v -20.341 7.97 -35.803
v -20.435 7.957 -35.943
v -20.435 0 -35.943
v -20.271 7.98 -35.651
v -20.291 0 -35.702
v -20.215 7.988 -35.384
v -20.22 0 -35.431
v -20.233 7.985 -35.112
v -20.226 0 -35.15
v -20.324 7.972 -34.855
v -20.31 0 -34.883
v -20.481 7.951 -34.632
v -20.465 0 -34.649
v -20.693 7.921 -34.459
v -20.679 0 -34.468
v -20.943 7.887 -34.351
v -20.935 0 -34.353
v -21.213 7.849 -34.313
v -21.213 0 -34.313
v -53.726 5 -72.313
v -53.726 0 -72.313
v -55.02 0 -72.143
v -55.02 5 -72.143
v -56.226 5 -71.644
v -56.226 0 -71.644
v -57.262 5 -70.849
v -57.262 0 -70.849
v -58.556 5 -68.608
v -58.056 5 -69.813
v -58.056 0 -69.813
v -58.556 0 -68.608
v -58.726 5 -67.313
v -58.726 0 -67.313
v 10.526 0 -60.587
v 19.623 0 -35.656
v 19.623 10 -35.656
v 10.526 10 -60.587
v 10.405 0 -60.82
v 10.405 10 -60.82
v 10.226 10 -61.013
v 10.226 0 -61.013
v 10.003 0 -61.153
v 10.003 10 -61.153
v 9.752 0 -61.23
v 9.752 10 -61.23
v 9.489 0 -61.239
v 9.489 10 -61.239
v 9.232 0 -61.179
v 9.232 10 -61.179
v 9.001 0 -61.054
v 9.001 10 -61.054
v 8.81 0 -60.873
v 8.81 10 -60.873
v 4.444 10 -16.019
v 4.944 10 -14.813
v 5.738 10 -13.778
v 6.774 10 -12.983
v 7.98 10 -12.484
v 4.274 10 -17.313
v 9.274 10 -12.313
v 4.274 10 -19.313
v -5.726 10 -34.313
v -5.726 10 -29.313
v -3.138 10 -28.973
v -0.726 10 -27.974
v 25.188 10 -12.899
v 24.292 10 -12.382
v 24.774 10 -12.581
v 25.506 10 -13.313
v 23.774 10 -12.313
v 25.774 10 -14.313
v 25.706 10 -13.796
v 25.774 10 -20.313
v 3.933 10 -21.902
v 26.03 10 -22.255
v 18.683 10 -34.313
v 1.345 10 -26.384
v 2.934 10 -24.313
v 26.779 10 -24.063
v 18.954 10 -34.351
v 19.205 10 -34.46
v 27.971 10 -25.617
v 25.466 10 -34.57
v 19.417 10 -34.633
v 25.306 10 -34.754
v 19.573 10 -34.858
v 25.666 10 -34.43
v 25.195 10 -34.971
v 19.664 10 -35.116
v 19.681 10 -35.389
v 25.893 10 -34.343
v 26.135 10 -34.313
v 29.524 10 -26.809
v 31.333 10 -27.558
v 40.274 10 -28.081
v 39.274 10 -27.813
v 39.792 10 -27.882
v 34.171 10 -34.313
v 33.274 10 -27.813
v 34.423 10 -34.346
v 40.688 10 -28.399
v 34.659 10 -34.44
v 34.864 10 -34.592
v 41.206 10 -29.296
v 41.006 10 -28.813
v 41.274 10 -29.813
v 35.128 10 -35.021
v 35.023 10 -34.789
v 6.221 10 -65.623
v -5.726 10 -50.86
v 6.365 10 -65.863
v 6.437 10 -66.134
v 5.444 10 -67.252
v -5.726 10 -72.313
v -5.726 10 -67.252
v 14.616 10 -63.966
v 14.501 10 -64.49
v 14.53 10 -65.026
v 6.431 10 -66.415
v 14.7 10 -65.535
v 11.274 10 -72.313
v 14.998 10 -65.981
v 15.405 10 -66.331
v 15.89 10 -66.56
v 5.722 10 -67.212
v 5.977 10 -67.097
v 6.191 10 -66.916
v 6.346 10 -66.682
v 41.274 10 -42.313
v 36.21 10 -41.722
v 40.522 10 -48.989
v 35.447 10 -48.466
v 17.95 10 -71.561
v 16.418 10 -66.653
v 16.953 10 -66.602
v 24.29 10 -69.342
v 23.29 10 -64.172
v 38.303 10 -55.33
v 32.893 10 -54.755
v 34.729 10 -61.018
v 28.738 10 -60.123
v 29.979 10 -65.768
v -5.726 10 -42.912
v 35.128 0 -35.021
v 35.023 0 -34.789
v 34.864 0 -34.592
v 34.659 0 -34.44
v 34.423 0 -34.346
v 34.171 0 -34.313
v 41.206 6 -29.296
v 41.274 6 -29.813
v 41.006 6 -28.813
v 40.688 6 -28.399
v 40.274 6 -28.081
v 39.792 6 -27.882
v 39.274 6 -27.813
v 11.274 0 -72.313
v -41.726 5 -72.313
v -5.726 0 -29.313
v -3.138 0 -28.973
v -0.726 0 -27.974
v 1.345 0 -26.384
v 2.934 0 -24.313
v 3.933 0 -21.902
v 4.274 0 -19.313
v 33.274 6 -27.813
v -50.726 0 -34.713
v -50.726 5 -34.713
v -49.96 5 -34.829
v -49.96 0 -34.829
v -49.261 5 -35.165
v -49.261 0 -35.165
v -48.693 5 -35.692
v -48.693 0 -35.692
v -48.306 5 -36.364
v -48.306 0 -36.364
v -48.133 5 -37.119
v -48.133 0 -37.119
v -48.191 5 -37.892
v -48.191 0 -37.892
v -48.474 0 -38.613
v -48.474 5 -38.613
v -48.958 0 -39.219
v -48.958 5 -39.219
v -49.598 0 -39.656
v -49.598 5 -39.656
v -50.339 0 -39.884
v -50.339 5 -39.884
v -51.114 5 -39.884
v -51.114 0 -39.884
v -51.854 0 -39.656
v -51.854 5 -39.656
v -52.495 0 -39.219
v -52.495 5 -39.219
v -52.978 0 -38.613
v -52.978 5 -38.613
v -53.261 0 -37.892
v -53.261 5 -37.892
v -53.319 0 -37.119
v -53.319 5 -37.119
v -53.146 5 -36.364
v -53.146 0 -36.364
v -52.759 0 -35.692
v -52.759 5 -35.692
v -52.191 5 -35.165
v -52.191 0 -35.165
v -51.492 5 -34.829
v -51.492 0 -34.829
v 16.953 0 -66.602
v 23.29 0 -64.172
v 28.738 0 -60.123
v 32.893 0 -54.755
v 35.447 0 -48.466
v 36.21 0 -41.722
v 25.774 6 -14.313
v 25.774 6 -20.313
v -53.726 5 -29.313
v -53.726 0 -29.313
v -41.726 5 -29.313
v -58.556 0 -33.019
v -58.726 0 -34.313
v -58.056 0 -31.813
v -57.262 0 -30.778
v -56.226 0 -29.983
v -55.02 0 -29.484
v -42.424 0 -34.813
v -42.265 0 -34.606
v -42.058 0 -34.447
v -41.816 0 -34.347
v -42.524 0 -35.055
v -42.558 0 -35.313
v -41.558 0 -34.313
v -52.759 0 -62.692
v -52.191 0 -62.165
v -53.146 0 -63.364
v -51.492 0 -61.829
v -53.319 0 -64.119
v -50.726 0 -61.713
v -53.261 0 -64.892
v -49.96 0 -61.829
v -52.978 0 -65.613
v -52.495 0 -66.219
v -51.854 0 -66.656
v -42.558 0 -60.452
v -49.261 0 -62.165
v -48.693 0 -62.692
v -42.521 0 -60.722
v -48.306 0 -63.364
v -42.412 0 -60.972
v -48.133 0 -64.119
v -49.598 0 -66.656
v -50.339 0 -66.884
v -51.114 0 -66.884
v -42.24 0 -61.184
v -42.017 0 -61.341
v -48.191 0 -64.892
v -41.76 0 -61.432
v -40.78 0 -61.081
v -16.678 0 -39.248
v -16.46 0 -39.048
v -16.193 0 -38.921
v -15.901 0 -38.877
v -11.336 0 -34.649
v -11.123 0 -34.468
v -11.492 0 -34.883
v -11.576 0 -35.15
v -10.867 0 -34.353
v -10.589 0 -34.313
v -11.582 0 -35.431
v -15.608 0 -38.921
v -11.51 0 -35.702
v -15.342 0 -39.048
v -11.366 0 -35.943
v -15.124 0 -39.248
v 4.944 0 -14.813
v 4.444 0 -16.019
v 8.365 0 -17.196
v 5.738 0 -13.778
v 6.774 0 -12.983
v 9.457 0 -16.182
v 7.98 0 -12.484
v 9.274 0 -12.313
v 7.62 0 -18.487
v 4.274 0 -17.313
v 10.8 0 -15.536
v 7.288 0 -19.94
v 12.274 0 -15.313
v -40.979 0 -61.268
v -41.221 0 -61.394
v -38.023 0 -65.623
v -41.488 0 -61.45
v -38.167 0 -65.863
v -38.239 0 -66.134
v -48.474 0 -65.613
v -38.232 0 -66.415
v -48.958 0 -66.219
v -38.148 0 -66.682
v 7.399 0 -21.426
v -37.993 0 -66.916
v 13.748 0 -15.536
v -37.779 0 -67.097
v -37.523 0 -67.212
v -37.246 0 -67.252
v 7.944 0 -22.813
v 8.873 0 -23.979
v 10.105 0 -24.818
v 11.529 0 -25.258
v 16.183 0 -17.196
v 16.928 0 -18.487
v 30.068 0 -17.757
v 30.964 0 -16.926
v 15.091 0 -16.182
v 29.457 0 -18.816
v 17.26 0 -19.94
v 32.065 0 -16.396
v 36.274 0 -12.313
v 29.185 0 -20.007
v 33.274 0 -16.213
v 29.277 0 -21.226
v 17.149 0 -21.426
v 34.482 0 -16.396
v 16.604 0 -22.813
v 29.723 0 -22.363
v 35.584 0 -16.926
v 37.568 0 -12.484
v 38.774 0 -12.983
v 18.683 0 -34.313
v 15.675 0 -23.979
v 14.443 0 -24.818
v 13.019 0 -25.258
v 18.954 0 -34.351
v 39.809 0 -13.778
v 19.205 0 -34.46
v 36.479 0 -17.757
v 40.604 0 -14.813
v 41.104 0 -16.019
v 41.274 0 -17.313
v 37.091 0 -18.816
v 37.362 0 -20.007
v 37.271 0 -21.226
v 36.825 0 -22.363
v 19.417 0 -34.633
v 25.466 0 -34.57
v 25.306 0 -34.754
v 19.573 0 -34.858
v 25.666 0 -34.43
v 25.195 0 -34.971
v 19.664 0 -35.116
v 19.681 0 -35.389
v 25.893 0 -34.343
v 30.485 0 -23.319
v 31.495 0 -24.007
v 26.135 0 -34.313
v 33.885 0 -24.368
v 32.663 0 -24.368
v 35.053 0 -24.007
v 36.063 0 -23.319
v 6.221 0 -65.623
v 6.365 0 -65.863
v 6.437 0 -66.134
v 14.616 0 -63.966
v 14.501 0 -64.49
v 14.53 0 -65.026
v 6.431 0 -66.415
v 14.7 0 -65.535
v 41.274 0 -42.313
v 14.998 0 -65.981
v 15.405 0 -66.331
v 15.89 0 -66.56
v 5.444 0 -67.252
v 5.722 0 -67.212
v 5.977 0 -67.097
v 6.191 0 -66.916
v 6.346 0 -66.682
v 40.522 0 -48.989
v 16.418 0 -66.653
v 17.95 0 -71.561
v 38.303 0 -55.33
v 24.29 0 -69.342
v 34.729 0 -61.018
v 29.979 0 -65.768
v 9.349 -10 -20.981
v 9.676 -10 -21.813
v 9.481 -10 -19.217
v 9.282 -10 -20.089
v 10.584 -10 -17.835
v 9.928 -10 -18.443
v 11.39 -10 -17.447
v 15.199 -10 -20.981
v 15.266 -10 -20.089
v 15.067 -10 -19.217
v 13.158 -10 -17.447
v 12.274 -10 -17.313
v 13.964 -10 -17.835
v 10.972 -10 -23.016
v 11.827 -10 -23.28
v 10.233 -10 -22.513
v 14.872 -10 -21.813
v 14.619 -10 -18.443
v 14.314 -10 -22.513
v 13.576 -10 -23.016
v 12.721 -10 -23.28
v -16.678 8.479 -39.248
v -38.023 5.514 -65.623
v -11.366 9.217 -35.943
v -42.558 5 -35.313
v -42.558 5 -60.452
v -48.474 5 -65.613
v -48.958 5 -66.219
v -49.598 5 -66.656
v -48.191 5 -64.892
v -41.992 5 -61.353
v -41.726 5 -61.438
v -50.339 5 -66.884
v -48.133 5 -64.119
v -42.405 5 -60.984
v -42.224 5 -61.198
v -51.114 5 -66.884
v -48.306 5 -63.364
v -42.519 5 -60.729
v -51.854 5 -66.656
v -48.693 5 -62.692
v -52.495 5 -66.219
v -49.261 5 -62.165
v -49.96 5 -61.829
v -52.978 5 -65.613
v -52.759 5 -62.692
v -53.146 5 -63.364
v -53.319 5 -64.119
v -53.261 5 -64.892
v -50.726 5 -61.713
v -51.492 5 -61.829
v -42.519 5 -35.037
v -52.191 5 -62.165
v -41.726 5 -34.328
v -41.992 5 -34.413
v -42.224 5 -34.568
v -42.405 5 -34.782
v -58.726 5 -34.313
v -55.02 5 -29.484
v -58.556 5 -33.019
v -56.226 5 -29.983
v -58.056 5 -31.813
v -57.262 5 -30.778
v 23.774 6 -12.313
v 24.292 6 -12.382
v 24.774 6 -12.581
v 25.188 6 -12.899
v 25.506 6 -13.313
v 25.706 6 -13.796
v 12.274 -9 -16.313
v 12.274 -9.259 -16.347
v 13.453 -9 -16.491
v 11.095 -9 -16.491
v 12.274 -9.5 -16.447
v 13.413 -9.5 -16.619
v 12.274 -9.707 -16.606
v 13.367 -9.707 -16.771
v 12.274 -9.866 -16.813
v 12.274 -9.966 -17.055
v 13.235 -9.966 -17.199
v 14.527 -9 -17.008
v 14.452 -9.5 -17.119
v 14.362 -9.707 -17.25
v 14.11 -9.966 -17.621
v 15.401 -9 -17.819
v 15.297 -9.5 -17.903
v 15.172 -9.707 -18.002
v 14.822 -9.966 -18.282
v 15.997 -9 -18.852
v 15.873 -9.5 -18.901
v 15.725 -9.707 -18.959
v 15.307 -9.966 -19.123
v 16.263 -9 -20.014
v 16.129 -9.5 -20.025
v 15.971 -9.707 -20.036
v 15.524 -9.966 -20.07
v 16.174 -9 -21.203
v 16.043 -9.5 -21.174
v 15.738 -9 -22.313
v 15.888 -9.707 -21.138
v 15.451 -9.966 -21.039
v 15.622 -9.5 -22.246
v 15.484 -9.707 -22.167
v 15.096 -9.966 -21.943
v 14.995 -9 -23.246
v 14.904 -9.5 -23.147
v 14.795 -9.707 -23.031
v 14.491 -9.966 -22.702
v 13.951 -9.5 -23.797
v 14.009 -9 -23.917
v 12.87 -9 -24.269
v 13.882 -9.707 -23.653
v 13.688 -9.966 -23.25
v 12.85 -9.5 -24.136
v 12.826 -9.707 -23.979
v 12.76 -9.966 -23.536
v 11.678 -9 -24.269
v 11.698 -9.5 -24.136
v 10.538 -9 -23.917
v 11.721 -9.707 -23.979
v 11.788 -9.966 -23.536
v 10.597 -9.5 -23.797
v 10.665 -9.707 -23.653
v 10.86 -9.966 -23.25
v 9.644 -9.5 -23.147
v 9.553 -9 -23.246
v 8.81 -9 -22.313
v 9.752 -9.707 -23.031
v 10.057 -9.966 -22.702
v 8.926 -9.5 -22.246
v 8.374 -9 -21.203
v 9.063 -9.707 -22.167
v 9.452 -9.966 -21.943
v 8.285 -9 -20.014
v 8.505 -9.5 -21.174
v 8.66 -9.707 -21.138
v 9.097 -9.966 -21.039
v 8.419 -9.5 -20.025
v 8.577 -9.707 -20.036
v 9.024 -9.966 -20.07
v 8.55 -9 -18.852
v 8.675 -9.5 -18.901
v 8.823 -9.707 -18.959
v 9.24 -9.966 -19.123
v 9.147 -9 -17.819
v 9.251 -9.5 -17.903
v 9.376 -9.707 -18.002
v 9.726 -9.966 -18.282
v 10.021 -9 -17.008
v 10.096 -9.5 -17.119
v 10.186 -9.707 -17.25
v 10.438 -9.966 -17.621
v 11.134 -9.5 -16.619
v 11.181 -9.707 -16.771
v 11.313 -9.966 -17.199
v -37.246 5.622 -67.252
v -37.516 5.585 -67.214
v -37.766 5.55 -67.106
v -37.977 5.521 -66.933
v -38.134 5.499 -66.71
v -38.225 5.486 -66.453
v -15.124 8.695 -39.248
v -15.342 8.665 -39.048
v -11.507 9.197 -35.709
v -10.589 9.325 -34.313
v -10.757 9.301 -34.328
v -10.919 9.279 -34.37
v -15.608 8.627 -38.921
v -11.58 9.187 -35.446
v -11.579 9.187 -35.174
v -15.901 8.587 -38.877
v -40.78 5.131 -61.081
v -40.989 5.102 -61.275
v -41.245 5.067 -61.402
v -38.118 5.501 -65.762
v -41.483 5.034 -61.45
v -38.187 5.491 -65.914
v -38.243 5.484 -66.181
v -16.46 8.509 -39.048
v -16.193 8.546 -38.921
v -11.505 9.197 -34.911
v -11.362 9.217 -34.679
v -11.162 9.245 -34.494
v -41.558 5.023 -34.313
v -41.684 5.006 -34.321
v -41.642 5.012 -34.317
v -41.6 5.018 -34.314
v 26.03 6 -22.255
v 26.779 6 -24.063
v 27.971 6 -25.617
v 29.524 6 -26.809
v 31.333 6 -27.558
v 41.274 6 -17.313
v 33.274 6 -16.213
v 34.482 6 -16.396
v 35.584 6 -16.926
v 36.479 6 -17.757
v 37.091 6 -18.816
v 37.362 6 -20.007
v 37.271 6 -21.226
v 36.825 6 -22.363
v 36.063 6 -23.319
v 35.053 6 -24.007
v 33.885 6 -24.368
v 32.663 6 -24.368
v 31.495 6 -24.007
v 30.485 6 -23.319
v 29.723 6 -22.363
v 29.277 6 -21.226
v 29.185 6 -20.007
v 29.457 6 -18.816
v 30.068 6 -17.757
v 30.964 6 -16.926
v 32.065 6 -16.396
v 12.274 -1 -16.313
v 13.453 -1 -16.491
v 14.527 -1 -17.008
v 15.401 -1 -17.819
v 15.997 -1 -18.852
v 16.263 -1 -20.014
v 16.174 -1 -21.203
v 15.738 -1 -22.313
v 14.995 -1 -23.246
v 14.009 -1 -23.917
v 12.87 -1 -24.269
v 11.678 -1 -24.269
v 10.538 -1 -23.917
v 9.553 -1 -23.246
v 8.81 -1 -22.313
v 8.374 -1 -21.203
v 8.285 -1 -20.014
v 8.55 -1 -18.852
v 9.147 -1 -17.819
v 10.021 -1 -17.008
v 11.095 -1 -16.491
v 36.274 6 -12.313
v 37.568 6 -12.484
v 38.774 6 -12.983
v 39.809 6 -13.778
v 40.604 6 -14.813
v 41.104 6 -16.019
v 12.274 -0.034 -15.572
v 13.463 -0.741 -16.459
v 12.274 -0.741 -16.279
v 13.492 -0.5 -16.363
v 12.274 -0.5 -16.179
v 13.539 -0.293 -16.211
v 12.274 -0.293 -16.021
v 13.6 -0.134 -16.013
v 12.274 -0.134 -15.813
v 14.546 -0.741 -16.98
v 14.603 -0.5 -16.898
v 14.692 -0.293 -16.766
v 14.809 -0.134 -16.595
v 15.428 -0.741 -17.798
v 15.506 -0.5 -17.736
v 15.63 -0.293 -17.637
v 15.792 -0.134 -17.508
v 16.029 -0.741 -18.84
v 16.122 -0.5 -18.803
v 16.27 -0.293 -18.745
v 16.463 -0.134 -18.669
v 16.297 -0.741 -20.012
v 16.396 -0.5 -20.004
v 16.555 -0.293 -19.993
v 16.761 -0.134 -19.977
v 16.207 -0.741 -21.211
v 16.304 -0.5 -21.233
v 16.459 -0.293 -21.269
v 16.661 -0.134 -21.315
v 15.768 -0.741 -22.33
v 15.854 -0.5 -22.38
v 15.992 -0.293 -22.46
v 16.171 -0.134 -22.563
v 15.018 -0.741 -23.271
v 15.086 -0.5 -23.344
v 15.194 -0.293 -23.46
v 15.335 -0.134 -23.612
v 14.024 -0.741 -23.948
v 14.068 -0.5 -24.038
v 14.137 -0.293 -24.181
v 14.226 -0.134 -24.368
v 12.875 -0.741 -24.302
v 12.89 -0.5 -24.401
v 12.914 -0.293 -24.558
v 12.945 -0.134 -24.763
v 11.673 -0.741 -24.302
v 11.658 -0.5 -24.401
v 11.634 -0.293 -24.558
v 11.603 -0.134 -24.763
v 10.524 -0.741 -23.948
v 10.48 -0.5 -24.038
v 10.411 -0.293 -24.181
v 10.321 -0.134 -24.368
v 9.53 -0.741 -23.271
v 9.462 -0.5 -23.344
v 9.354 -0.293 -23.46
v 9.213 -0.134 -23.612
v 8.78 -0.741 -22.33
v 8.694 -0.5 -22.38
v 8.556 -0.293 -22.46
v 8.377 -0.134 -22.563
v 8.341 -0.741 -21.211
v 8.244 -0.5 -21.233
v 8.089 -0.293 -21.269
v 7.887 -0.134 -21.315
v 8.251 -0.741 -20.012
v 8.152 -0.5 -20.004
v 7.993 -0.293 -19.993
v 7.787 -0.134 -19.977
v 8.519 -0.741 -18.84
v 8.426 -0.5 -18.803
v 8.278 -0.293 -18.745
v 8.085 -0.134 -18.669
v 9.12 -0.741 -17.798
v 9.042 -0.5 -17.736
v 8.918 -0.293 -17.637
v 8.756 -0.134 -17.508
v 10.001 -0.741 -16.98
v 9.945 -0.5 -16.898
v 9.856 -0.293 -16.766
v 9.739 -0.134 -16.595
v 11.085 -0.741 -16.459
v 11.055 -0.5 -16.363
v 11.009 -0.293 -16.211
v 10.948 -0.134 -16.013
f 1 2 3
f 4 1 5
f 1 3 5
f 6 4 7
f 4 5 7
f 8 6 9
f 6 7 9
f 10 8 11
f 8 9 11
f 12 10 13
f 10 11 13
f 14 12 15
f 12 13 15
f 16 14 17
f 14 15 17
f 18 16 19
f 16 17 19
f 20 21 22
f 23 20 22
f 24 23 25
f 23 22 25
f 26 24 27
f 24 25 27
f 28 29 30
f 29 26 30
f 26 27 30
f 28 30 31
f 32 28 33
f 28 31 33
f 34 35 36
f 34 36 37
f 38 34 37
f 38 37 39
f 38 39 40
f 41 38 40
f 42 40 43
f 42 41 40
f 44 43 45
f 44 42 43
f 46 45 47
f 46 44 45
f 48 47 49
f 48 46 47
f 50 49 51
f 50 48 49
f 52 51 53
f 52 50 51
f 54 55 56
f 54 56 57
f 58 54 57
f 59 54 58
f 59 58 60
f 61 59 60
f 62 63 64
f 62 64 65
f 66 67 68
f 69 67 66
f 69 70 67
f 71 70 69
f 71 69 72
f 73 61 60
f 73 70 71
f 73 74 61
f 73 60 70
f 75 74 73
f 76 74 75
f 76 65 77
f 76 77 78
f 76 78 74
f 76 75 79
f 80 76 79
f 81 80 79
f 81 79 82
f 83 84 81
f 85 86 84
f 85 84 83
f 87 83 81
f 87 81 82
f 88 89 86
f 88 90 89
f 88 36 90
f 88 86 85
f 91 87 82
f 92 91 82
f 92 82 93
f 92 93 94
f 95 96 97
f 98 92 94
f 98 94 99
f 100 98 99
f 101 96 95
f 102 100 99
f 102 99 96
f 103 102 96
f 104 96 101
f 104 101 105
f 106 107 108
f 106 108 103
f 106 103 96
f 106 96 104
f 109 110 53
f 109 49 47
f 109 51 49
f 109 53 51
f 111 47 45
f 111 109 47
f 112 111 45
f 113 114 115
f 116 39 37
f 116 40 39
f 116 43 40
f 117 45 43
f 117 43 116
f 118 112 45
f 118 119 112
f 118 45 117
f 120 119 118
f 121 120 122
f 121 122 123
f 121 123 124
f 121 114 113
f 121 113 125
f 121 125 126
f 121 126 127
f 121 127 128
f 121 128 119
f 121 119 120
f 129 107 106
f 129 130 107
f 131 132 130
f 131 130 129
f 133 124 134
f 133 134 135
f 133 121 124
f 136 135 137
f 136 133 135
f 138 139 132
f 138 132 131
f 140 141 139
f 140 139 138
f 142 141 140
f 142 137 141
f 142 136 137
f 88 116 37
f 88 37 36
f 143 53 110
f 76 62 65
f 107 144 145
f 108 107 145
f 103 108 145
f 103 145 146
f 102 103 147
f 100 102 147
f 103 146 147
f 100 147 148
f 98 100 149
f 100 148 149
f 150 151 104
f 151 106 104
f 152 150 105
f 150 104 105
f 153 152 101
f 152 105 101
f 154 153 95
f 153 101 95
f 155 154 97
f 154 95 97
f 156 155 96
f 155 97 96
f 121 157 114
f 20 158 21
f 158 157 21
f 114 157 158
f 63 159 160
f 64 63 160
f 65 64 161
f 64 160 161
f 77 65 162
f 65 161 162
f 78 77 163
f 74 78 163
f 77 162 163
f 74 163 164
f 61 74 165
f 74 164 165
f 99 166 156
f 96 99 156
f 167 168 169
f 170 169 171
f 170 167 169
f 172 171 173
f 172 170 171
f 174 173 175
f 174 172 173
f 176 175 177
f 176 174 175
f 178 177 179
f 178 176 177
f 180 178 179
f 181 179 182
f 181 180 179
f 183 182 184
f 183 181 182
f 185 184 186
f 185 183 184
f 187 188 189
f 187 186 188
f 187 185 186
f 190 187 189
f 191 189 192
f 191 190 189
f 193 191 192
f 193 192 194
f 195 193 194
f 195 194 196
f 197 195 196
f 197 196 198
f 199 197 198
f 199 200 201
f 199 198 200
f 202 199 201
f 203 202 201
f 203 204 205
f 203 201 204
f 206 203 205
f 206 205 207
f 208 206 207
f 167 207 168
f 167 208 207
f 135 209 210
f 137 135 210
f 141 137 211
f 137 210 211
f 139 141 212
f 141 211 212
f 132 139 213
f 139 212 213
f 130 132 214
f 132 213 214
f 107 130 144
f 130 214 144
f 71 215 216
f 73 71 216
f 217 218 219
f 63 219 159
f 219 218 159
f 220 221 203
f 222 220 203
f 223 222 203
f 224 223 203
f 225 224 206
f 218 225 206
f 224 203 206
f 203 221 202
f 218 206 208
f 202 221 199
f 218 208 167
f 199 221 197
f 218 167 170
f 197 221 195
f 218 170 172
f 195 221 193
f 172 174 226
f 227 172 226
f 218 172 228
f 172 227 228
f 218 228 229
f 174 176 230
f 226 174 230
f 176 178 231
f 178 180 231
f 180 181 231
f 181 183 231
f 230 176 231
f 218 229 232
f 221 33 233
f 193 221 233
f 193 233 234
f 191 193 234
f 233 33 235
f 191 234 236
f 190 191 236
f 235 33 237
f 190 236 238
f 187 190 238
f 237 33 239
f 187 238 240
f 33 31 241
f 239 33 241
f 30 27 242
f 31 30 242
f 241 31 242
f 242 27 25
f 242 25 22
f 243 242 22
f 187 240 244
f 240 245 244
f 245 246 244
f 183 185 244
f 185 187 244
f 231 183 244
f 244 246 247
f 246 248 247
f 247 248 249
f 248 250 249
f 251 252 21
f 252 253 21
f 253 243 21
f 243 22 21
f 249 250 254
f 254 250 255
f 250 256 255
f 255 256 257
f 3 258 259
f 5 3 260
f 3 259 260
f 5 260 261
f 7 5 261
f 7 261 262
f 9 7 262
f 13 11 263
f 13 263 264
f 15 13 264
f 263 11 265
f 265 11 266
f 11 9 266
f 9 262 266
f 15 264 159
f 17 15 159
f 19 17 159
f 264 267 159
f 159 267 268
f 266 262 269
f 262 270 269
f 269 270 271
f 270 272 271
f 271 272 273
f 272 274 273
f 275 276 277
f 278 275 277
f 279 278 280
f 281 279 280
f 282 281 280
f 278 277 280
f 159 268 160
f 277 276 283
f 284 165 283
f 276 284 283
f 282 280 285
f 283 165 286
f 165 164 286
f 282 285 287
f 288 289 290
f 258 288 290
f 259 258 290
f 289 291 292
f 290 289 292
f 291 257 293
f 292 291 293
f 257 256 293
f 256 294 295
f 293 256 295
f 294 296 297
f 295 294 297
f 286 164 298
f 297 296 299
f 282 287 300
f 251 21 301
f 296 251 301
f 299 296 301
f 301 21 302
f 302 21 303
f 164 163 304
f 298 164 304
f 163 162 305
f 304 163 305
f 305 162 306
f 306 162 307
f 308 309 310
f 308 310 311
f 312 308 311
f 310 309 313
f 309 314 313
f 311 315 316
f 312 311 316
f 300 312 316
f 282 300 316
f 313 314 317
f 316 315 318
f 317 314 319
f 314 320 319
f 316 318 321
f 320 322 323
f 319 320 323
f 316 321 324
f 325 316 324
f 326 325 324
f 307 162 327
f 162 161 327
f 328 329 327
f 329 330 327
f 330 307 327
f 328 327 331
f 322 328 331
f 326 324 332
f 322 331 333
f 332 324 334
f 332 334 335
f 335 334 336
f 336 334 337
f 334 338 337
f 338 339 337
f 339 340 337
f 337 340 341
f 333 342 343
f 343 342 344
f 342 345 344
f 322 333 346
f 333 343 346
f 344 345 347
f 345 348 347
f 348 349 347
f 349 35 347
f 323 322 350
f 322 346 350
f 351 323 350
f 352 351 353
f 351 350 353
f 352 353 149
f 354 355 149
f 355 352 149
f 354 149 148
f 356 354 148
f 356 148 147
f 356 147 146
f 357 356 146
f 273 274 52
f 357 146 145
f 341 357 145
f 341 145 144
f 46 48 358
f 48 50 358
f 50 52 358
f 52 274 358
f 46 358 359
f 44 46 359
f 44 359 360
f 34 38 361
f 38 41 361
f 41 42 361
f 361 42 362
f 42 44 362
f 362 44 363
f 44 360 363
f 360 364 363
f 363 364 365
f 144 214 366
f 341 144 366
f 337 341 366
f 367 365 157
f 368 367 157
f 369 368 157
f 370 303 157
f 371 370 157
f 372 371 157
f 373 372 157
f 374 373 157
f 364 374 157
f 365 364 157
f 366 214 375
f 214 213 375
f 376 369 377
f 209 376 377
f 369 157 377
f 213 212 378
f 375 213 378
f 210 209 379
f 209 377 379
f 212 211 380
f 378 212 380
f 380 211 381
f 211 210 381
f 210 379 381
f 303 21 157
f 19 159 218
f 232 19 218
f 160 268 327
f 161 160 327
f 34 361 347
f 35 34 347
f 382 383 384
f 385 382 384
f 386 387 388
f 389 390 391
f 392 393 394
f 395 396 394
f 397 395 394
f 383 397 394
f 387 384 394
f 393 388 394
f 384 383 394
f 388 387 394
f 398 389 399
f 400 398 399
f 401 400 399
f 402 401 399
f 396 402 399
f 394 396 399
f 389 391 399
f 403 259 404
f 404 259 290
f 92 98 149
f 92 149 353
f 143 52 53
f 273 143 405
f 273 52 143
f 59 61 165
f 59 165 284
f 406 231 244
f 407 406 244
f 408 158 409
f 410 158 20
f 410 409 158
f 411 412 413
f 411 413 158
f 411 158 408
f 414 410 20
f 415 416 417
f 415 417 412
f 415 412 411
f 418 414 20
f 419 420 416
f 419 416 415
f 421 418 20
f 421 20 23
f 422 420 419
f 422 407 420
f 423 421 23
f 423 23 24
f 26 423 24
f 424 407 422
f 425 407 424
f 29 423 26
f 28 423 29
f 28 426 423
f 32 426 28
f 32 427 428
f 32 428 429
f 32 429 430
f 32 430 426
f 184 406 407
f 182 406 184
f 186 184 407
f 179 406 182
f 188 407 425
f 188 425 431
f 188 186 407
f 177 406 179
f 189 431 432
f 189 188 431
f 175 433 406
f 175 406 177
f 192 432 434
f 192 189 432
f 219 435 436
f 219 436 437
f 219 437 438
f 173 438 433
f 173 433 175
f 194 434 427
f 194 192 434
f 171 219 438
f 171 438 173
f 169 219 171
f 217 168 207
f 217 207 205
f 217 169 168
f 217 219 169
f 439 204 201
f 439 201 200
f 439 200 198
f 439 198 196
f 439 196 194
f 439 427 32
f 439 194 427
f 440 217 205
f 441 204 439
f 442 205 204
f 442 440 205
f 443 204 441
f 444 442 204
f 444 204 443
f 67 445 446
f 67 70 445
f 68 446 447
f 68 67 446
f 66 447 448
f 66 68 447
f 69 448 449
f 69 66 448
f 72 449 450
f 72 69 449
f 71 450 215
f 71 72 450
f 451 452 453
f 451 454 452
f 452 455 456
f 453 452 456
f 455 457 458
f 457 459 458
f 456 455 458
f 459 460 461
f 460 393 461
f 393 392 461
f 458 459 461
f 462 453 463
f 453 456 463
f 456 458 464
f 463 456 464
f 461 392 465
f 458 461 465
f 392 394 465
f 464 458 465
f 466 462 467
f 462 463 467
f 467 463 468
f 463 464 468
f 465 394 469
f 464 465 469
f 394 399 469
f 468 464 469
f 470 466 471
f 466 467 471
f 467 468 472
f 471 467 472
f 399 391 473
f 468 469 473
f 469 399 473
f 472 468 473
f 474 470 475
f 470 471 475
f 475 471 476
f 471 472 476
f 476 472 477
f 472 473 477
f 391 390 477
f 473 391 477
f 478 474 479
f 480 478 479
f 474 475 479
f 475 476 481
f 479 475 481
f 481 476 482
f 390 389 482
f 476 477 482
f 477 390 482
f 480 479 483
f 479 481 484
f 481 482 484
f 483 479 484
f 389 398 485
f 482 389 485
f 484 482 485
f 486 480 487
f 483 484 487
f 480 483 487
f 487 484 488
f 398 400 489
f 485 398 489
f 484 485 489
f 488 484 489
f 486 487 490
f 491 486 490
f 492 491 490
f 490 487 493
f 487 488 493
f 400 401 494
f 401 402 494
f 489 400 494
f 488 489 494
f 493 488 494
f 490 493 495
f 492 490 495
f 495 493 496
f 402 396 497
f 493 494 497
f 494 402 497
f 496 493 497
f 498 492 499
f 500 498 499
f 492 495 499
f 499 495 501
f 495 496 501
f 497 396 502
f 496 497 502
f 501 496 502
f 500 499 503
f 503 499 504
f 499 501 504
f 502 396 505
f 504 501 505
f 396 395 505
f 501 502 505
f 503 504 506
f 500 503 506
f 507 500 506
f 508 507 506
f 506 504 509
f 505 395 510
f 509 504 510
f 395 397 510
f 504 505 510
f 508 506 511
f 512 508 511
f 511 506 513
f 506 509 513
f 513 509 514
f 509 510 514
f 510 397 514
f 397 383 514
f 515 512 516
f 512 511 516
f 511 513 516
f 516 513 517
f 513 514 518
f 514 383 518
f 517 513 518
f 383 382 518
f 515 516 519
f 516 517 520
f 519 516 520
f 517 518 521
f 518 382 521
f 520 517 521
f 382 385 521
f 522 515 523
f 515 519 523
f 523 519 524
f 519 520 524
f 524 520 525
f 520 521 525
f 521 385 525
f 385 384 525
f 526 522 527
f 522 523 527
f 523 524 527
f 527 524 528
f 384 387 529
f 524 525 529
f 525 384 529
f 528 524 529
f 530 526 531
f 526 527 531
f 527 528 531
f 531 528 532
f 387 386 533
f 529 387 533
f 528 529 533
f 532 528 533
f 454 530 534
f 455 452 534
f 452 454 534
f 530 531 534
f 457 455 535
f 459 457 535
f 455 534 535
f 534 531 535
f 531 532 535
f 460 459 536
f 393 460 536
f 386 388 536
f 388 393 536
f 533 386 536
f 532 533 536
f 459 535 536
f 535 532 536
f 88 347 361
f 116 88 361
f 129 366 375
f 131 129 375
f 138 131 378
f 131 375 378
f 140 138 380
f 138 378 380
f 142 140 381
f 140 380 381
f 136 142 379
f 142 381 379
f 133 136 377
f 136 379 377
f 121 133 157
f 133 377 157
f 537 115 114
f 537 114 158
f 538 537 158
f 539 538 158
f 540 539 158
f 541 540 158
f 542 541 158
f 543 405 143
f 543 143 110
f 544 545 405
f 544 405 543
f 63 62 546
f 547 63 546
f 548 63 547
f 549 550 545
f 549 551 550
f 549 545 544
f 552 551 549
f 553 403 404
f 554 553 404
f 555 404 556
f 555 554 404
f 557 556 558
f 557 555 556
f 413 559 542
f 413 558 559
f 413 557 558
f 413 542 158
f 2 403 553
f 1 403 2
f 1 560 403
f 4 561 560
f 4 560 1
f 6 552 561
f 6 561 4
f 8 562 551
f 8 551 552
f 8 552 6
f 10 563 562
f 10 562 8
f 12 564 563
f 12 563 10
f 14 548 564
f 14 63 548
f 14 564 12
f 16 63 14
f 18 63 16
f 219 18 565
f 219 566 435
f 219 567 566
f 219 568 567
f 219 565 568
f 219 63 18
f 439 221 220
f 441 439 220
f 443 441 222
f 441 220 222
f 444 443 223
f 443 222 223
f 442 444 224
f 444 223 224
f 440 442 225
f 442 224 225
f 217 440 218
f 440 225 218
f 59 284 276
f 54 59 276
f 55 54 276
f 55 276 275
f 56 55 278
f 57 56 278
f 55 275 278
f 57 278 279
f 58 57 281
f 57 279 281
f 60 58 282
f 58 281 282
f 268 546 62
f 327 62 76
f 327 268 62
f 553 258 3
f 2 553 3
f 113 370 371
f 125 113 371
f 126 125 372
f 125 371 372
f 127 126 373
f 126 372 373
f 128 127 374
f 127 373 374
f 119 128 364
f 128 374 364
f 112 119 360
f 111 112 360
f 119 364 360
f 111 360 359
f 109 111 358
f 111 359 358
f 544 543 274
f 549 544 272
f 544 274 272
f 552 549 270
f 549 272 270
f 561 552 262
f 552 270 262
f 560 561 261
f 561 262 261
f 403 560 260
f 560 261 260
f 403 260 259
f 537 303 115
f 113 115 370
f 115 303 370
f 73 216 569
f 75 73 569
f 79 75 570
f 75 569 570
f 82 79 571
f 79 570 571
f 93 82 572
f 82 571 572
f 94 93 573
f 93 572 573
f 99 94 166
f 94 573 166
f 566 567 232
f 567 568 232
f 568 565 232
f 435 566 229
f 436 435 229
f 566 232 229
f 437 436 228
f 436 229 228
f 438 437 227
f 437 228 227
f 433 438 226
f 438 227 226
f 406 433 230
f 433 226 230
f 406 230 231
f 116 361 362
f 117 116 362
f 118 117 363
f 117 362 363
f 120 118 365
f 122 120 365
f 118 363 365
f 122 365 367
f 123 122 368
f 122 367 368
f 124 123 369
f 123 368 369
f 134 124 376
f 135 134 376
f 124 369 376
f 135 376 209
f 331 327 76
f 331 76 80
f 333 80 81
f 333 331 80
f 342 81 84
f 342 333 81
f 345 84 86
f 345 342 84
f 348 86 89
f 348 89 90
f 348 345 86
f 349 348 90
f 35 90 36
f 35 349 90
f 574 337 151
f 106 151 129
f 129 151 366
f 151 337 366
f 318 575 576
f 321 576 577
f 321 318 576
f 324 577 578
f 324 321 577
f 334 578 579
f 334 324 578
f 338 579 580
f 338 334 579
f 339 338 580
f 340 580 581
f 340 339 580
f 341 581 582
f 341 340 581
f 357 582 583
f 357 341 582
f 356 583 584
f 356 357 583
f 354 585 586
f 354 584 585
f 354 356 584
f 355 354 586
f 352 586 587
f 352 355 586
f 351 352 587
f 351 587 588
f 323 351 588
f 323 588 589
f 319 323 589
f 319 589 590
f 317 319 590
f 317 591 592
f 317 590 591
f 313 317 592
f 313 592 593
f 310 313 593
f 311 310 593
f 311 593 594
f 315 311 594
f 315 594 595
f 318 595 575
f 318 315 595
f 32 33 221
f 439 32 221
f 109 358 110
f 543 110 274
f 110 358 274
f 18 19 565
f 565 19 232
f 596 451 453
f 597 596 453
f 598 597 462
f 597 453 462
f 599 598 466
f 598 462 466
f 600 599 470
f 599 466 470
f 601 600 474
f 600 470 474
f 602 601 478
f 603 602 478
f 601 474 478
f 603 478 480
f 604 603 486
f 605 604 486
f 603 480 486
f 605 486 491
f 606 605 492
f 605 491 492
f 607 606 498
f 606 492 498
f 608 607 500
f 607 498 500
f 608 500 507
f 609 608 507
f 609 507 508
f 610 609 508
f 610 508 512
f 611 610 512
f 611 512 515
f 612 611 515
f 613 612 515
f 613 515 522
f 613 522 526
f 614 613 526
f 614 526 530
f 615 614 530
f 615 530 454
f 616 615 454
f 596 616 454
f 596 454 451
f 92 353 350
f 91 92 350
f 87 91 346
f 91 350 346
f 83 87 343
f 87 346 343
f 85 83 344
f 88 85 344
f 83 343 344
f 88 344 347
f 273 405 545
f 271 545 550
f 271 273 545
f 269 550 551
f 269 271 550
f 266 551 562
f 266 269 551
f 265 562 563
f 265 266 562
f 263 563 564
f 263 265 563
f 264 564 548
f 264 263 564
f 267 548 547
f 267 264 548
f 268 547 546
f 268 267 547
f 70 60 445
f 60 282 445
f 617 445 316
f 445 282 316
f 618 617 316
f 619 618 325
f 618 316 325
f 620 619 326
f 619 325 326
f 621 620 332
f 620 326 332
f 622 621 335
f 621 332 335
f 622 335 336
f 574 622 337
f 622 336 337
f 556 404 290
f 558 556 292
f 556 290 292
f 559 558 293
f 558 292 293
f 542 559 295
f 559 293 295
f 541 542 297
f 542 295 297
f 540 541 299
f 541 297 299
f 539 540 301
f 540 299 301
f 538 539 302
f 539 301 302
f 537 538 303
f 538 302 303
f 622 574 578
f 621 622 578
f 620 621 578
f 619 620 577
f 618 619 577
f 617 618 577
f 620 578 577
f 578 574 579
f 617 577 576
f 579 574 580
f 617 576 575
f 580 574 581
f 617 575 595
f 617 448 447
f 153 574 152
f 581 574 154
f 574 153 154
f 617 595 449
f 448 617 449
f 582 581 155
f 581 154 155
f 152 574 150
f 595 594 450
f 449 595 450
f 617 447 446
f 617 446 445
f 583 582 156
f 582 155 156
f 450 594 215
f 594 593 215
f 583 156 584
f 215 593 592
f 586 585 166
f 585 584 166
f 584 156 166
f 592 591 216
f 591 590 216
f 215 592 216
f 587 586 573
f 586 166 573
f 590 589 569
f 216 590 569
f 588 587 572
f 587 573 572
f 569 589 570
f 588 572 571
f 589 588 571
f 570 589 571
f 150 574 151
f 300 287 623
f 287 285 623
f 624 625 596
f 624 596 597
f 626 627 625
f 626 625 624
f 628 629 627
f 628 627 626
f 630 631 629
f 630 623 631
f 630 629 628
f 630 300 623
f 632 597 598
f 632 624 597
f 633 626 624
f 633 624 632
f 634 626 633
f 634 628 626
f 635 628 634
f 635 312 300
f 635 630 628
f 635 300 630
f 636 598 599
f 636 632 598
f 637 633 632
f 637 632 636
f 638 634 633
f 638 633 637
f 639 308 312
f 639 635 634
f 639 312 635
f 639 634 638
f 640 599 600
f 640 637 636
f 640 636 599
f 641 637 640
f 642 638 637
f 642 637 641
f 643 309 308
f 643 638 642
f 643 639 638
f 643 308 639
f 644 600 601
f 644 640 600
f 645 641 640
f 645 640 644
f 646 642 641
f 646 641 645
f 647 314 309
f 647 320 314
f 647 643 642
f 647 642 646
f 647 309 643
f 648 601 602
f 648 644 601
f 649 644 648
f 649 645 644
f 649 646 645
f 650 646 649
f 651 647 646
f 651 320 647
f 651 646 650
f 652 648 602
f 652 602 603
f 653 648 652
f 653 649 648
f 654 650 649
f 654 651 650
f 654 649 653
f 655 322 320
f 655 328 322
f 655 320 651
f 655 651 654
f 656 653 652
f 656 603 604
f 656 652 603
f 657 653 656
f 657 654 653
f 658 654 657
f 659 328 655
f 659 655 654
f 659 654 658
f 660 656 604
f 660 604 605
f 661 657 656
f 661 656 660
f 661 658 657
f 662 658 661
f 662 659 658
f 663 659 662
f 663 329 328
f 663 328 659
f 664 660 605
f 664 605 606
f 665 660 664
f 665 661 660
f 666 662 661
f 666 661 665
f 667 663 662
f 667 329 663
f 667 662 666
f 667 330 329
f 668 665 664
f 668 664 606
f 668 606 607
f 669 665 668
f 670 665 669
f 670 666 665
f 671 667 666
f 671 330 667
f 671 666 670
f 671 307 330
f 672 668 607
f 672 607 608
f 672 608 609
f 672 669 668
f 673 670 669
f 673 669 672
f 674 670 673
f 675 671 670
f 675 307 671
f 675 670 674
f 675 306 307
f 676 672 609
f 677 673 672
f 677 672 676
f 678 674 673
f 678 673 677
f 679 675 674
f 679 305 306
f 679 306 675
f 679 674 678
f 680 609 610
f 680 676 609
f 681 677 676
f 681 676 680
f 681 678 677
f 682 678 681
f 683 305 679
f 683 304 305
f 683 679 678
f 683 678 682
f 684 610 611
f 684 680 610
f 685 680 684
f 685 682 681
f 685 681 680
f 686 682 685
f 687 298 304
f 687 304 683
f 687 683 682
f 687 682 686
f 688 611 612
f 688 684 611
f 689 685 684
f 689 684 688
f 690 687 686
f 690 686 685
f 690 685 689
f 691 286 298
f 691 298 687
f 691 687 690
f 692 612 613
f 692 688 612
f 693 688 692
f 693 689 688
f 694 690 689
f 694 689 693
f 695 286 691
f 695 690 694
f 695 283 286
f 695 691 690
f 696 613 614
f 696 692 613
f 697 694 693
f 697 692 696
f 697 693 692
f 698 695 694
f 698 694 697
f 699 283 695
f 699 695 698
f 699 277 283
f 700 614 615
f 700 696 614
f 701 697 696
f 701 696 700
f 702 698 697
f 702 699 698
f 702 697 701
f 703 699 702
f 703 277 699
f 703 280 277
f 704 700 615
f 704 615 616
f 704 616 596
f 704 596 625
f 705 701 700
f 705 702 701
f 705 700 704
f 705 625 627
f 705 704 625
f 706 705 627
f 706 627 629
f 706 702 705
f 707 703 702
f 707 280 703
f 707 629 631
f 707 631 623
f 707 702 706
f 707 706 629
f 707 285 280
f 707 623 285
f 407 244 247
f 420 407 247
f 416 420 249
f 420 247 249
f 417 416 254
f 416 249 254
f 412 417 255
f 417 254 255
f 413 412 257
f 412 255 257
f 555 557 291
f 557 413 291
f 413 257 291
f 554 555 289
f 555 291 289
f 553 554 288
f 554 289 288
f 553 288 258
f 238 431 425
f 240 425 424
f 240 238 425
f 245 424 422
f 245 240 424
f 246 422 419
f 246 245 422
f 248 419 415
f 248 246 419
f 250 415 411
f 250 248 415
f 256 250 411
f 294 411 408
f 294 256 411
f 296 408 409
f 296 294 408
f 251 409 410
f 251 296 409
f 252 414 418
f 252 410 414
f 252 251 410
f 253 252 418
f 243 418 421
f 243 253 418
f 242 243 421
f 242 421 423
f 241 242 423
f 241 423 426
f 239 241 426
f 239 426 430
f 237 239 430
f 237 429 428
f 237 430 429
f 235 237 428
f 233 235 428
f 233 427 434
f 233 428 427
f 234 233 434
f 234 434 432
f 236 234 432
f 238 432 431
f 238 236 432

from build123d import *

# Parameters (mm, degrees)
SKETCH1_R           = 4.1
SKETCH1_R_2         = 4
SKETCH1_R_3         = 2.6
BOSS_EXTRUDE1_DEPTH = 10
CUT_EXTRUDE1_START  = -4
CUT_EXTRUDE1_DEPTH  = 4
FILLET1_R           = 2
BOSS_EXTRUDE2_START = -20
SKETCH3_R           = 4
BOSS_EXTRUDE2_DEPTH = 20
FILLET2_R           = 1
CUT_EXTRUDE2_REACH  = 75.469


with BuildPart() as part:
    # Sketch1 → Boss-Extrude1 (new body)
    with BuildSketch(Plane(origin=(0, 0, 0), x_dir=(1, 0, 0), z_dir=(0, 1, 0))):
        with BuildLine():
            Line((11.273947383, 72.313413723), (4.792068361, 72.313413723))
            Line((4.792068361, 72.313413723), (-53.726052617, 72.313413723))
            ThreePointArc((-53.726052617, 72.313413723), (-57.261586523, 70.848947629), (-58.726052617, 67.313413723))
            Line((-58.726052617, 67.313413723), (-58.726052617, 34.313413723))
            ThreePointArc((-58.726052617, 34.313413723), (-57.261586523, 30.777879817), (-53.726052617, 29.313413723))
            Line((-53.726052617, 29.313413723), (-5.726052617, 29.313413723))
            ThreePointArc((-5.726052617, 29.313413723), (1.345015195, 26.384481534), (4.273947383, 19.313413723))
            Line((4.273947383, 19.313413723), (4.273947383, 17.313413723))
            ThreePointArc((4.273947383, 17.313413723), (5.738413477, 13.777879817), (9.273947383, 12.313413723))
            Line((9.273947383, 12.313413723), (36.273947383, 12.313413723))
            ThreePointArc((36.273947383, 12.313413723), (39.809481289, 13.777879817), (41.273947383, 17.313413723))
            Line((41.273947383, 17.313413723), (41.273947383, 42.313413723))
            ThreePointArc((41.273947383, 42.313413723), (32.487150819, 63.526617158), (11.273947383, 72.313413723))
        make_face()
        with Locations(Location((33.273947383, 20.313413723, 0), (0, 0, 270))):
            Circle(SKETCH1_R, mode=Mode.SUBTRACT)
        with Locations(Location((12.273947383, 20.313413723, 0), (0, 0, 270))):
            Circle(SKETCH1_R_2, mode=Mode.SUBTRACT)
        with Locations(Location((-50.726052617, 64.313413723, 0), (0, 0, 270))):
            Circle(SKETCH1_R_3, mode=Mode.SUBTRACT)
        with Locations(Location((-50.726052617, 37.313413723, 0), (0, 0, 270))):
            Circle(SKETCH1_R_3, mode=Mode.SUBTRACT)
        with BuildLine():
            Line((34.171420048, 34.313413723), (26.134777641, 34.313413723))
            ThreePointArc((26.134777641, 34.313413723), (25.561526201, 34.49403421), (25.19535667, 34.97064815))
            Line((25.19535667, 34.97064815), (14.615821544, 63.966084002))
            ThreePointArc((14.615821544, 63.966084002), (14.998488248, 65.980552022), (16.952543045, 66.601989919))
            ThreePointArc((16.952543045, 66.601989919), (32.892900514, 54.755368869), (35.127730175, 35.021059585))
            ThreePointArc((35.127730175, 35.021059585), (34.766250218, 34.509562325), (34.171420048, 34.313413723))
        make_face(mode=Mode.SUBTRACT)
        with BuildLine():
            Line((-42.557674575, 35.313413723), (-42.557674575, 60.452375226))
            ThreePointArc((-42.557674575, 60.452375226), (-41.891342574, 61.395065879), (-40.780343242, 61.081466633))
            Line((-40.780343242, 61.081466633), (-20.435473581, 35.94250513))
            ThreePointArc((-20.435473581, 35.94250513), (-20.310283056, 34.882769674), (-21.212804914, 34.313413723))
            Line((-21.212804914, 34.313413723), (-41.557674575, 34.313413723))
            ThreePointArc((-41.557674575, 34.313413723), (-42.264781356, 34.606306941), (-42.557674575, 35.313413723))
        make_face(mode=Mode.SUBTRACT)
        with BuildLine():
            Line((-37.245793747, 67.251595954), (5.443945576, 67.251595954))
            ThreePointArc((5.443945576, 67.251595954), (6.346467434, 66.682240002), (6.221276909, 65.622504547))
            Line((6.221276909, 65.622504547), (-15.123592752, 39.247901728))
            ThreePointArc((-15.123592752, 39.247901728), (-15.900924085, 38.876993135), (-16.678255419, 39.247901728))
            Line((-16.678255419, 39.247901728), (-38.02312508, 65.622504547))
            ThreePointArc((-38.02312508, 65.622504547), (-38.148315604, 66.682240002), (-37.245793747, 67.251595954))
        make_face(mode=Mode.SUBTRACT)
        with BuildLine():
            Line((19.622800135, 35.656179295), (10.526467022, 60.58658882))
            ThreePointArc((10.526467022, 60.58658882), (9.751557094, 61.230198488), (8.809714717, 60.872914654))
            Line((8.809714717, 60.872914654), (-11.36637459, 35.94250513))
            ThreePointArc((-11.36637459, 35.94250513), (-11.491565114, 34.882769674), (-10.589043257, 34.313413723))
            Line((-10.589043257, 34.313413723), (18.683379163, 34.313413723))
            ThreePointArc((18.683379163, 34.313413723), (19.502758676, 34.740162282), (19.622800135, 35.656179295))
        make_face(mode=Mode.SUBTRACT)
    extrude(amount=BOSS_EXTRUDE1_DEPTH)

    # Sketch2 → Cut-Extrude1 (cut)
    with BuildSketch(Plane(origin=(0, 10, 0), x_dir=(1, 0, 0), z_dir=(0, 1, 0)).offset(CUT_EXTRUDE1_START)):
        with BuildLine():
            Line((33.273947383, 27.813413723), (41.273947383, 27.813413723))
            Line((41.273947383, 27.813413723), (41.273947383, 17.313413723))
            ThreePointArc((41.273947383, 17.313413723), (39.809481289, 13.777879817), (36.273947383, 12.313413723))
            Line((36.273947383, 12.313413723), (25.773947383, 12.313413723))
            Line((25.773947383, 12.313413723), (25.773947383, 20.313413723))
            ThreePointArc((25.773947383, 20.313413723), (27.970646524, 25.616714582), (33.273947383, 27.813413723))
        make_face()
    extrude(amount=CUT_EXTRUDE1_DEPTH, mode=Mode.SUBTRACT)

    # Fillet1
    fillet1_edges = [part.edges().sort_by_distance(p)[0] for p in [
        (41.273947383, 8, -27.813413723),
        (25.773947383, 8, -12.313413723),
    ]]
    fillet(fillet1_edges, radius=FILLET1_R)

    # Sketch3 → Boss-Extrude2 (add)
    with BuildSketch(Plane(origin=(0, 10, 0), x_dir=(1, 0, 0), z_dir=(0, 1, 0)).offset(BOSS_EXTRUDE2_START)):
        with Locations(Location((12.273947383, 20.313413723, 0), (0, 0, 270))):
            Circle(SKETCH3_R)
    extrude(amount=BOSS_EXTRUDE2_DEPTH)

    # Fillet2
    fillet2_edges = [part.edges().sort_by_distance(p)[0] for p in [
        (12.273947383, -10, -24.313413723),
        (12.273947383, 0, -24.313413723),
    ]]
    fillet(fillet2_edges, radius=FILLET2_R)

    # Cut-Extrude2: up to this face of the body (flat: up to its plane)
    cut_extrude2_end = Plane(part.part.faces().sort_by_distance((-21.226052617, 5, -72.313413723))[0])
    # Sketch4 → Cut-Extrude2 (cut, up to the picked face)
    with BuildSketch(Plane.XY.offset(-29.313413723), mode=Mode.PRIVATE) as cut_extrude2_sk1:
        Polygon((-5.726052617, 10), (-41.726052617, 5), (-62.366339881, 5), (-62.366339881, 10), align=None)
    cut_extrude2_tool1 = split(extrude(cut_extrude2_sk1.sketch, amount=-CUT_EXTRUDE2_REACH, mode=Mode.PRIVATE), bisect_by=cut_extrude2_end, keep=Keep.BOTH, mode=Mode.PRIVATE)
    add(cut_extrude2_tool1.solids().sort_by(Axis((-41.648691, 7.888196, -29.313414), (0, 0, -1)))[0], mode=Mode.SUBTRACT)


solid = part.part
